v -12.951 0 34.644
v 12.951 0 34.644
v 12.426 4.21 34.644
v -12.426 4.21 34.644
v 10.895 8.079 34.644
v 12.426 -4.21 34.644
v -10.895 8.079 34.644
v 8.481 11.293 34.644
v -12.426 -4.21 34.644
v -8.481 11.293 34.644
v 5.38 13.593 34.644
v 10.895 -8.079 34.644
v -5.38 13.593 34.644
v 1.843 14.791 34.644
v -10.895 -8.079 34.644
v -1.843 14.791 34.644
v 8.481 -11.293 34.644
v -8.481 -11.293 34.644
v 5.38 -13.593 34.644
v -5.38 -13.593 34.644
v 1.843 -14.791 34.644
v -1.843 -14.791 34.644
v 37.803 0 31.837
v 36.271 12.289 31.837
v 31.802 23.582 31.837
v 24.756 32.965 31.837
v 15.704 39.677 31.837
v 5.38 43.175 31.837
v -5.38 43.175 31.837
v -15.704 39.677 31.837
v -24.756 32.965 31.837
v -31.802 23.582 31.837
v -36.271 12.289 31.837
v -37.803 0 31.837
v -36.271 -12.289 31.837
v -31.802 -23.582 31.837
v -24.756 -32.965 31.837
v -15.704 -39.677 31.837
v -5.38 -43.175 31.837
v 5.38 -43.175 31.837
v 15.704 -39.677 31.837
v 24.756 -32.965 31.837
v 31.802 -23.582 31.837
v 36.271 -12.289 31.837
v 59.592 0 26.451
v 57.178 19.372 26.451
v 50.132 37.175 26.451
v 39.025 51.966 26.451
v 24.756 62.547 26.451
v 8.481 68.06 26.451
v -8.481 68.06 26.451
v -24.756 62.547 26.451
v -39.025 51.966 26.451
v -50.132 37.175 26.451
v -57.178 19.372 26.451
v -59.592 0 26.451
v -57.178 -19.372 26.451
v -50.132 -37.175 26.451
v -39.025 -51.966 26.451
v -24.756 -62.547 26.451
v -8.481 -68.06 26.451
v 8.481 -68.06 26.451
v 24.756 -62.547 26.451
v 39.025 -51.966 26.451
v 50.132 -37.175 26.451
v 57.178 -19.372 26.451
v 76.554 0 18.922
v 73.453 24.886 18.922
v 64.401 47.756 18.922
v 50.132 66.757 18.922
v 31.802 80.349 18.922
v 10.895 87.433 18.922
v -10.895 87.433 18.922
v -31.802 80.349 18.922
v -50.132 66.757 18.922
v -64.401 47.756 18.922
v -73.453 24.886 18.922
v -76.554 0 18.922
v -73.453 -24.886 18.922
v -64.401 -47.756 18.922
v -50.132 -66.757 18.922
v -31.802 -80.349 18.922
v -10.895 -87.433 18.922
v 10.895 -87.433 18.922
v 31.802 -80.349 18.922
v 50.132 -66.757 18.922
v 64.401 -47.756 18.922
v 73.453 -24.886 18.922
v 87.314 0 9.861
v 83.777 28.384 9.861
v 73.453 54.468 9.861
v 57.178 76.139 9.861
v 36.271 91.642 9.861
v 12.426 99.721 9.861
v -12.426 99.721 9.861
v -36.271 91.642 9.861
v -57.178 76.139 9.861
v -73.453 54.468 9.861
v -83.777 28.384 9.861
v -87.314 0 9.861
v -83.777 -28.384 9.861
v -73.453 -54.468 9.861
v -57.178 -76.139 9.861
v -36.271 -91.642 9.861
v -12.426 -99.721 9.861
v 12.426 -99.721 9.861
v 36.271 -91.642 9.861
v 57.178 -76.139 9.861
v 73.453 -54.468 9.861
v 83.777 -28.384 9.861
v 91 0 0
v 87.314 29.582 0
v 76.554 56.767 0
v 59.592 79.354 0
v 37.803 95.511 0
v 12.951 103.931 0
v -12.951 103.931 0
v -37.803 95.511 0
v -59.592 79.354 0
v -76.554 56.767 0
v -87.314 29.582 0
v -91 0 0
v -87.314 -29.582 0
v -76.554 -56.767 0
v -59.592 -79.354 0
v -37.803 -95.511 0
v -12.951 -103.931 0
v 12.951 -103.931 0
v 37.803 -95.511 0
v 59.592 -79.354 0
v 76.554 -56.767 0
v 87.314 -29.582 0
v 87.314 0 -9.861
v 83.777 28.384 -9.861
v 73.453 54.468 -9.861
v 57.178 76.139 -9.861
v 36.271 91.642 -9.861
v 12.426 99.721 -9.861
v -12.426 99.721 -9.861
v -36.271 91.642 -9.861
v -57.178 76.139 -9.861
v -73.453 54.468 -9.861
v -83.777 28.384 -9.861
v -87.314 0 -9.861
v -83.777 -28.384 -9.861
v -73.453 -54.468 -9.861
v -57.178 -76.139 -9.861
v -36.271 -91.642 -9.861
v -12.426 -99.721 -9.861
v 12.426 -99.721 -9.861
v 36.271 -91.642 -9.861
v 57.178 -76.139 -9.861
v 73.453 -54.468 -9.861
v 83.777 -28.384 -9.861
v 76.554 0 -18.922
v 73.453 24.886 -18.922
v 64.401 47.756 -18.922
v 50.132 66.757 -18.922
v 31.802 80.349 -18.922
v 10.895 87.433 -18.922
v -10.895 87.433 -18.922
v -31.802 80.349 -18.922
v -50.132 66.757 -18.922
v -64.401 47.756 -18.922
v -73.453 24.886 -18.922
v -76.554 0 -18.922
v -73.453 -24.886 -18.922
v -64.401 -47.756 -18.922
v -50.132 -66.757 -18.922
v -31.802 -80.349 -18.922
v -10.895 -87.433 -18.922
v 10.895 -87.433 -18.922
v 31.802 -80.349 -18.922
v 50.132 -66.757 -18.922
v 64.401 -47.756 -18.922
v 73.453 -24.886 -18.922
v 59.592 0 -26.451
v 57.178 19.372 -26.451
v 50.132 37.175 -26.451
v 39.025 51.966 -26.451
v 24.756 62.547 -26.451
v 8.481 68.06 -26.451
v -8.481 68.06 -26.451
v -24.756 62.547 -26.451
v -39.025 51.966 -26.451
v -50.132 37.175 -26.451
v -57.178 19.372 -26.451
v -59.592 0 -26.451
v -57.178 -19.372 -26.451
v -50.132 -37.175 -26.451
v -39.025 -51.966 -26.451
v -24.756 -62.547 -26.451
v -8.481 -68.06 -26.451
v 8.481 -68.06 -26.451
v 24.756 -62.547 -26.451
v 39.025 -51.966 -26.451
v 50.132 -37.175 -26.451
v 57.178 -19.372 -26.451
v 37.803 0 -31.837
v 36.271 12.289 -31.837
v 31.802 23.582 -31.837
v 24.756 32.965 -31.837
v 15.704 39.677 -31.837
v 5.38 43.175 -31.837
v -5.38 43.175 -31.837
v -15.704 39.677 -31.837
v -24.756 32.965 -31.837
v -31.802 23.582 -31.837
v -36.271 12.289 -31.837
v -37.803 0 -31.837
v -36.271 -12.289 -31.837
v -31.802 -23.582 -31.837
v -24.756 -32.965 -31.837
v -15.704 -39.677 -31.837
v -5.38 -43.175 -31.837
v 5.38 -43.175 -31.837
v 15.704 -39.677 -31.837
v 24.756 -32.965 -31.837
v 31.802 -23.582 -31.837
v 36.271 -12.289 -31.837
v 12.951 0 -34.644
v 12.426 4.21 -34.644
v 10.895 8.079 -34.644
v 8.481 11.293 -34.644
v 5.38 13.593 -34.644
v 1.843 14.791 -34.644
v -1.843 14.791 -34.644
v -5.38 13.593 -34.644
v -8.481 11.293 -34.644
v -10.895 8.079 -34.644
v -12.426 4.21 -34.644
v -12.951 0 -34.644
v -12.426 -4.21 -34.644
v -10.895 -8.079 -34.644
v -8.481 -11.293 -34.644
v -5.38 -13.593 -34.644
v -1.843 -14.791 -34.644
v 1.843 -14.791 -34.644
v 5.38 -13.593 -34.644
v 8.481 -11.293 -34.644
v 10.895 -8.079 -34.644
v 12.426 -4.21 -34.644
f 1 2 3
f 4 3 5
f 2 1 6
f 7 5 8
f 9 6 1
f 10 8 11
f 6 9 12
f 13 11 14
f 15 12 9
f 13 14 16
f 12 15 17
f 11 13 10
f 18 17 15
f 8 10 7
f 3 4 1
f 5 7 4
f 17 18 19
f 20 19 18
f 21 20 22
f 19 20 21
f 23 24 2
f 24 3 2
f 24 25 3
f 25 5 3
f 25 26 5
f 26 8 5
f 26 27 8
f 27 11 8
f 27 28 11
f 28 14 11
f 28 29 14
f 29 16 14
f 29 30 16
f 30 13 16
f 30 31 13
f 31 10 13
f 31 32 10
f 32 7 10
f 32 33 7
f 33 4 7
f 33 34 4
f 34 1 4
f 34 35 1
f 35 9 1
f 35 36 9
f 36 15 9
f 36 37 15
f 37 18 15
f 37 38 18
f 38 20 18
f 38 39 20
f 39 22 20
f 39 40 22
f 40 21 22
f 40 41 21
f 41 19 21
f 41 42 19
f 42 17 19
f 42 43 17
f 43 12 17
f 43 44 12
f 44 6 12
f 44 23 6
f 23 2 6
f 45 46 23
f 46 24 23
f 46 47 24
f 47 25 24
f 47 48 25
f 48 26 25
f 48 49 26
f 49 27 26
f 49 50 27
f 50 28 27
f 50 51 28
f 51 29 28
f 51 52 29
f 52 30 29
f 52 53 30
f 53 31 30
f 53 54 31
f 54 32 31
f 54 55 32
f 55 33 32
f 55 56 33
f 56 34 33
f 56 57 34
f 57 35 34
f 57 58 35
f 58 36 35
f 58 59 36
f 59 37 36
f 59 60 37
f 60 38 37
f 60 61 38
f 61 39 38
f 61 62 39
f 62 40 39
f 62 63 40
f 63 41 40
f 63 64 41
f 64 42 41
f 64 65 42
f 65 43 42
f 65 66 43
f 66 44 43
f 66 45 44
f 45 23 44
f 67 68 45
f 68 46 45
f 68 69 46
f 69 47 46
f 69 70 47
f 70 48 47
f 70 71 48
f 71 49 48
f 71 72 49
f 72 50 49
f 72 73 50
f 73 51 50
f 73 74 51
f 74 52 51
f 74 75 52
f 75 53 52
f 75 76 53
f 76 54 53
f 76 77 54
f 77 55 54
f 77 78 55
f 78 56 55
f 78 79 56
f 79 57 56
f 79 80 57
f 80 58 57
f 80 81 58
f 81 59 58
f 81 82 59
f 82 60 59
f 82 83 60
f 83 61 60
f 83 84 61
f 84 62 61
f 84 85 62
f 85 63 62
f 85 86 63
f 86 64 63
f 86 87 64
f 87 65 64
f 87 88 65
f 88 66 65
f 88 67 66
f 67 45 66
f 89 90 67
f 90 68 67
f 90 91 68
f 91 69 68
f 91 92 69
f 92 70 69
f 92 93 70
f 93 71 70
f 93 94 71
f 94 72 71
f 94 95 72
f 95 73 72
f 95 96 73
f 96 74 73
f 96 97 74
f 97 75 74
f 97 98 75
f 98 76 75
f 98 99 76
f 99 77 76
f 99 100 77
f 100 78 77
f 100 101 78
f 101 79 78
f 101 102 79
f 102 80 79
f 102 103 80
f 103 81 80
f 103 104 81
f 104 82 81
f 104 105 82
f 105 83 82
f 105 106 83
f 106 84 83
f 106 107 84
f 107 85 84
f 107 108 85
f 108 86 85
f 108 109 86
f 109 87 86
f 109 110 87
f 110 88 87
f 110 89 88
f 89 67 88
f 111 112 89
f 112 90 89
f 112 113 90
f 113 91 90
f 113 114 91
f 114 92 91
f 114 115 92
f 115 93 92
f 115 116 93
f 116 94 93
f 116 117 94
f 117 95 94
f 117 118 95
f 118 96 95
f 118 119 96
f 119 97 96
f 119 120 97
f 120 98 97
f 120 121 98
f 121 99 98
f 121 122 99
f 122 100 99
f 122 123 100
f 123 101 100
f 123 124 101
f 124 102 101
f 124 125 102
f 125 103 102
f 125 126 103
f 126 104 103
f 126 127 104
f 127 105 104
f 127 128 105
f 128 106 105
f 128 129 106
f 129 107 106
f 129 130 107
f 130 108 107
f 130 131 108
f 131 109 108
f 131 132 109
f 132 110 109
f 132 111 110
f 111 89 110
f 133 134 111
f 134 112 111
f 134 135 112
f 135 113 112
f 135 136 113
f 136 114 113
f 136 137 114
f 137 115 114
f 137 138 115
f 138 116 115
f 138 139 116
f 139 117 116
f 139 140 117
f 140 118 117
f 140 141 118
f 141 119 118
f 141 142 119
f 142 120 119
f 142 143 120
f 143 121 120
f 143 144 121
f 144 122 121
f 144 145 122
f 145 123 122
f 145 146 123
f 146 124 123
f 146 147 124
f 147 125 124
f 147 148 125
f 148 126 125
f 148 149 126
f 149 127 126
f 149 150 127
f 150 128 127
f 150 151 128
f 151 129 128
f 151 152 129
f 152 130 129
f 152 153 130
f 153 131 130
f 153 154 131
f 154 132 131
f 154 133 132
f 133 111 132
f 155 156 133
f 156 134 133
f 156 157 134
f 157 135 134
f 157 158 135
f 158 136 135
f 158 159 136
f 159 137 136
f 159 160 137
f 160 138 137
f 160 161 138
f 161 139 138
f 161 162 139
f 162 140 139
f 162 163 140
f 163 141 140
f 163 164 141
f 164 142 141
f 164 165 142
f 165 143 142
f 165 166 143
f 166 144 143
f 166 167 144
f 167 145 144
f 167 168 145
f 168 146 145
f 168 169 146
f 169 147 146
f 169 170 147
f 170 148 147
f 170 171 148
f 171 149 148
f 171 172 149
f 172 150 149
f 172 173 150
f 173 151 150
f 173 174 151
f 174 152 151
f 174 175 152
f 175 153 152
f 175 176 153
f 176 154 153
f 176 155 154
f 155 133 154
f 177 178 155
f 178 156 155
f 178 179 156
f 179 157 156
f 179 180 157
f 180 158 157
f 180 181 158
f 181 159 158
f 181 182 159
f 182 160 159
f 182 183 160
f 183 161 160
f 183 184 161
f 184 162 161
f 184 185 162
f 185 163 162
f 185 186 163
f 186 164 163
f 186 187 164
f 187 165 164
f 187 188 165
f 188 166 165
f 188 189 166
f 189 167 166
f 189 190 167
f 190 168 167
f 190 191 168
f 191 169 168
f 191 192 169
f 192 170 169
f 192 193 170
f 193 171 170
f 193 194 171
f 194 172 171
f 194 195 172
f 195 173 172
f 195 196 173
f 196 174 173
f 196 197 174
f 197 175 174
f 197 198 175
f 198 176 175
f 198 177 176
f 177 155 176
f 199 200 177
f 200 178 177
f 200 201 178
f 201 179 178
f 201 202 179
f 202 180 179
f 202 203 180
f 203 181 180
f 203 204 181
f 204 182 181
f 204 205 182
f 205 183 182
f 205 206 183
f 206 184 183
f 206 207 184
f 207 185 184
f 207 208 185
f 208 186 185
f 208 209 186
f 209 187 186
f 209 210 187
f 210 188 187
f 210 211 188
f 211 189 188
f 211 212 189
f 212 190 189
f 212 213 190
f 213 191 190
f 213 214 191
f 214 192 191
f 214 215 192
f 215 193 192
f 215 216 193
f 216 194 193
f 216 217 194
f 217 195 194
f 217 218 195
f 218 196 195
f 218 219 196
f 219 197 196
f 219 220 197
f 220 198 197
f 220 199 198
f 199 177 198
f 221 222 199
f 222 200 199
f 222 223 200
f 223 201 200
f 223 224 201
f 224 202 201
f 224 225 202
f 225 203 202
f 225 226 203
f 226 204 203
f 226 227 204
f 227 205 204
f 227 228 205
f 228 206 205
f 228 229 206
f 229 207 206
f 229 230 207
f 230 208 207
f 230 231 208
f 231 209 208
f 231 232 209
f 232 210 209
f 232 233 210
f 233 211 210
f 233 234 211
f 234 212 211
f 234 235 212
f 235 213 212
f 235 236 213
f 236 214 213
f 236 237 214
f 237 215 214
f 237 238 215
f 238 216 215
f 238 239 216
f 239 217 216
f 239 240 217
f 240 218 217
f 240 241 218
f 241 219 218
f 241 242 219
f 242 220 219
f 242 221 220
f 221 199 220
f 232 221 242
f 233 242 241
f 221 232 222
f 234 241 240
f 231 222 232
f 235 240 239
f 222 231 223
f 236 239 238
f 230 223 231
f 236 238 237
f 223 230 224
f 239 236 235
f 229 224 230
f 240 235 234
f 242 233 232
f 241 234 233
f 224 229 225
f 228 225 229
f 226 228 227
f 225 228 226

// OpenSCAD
// Generated by SolidPython 1.0.1 on 2020-07-29 00:46:51


scale(v = [13, 15, 5]) {
	sphere(r = 7);
}
/***********************************************
*********      SolidPython code:      **********
************************************************
 
# import packages: SolidPython
from solid import *
from solid.utils import *
from itertools import chain, combinations, permutations


class Resize:

    def __init__(self, scad_file):
        self.scad_file = scad_file
        #self.scad_file = import_scad(scad_file)
        # cone/cylinder param:
        self.r1 = 0
        self.r2 = 0
        self.h = 0
        # rectangular prism param:
        self.w = 0
        self.l = 0
        # ellipse param:
        self.r = 0

    # import OpenScad code (file name corresponds to shape)


    # classify shape + parameters
    def assign(self, param1, param2, param3):
        if self.scad_file == 'cone.scad':
            self.r1 = param1
            self.r2 = param2
            self.h = param3
        elif self.scad_file == 'cylinder.scad':
            self.r1 = param1
            self.r2 = param2
            self.h = param3
        elif self.scad_file == 'rectangularPrism.scad':
            self.h = param1
            self.l = param2
            self.w = param3
        else:
            self.r = param1
            self.h = param2

    # resize parameters
    def iterate(self):
        x = range(3, 20, 2)
        i = 1
        if self.scad_file == 'cone.scad':
            tempList = list(permutations(x, 2))
            for temp in tempList:
                param1 = temp[0]
                param2 = temp[1]
                filepath = 'produced_scad_files/' + 'cone' + str(param1) + '_' + str(param2) + '_' + '.scad'
                scad_render_to_file(cylinder(h=param1, r1=param2, r2=0), filepath)

        elif self.scad_file == 'cylinder.scad':
            tempList = list(permutations(x, 3))
            for temp in tempList:
                param1 = temp[0]
                param2 = temp[1]
                filepath = 'produced_scad_files/' + 'cylinder' + str(param1) + '_' + str(param2) + '_' + '.scad'
                scad_render_to_file(cylinder(h=param1, r1=param2, r2=param2), filepath)

        elif self.scad_file == 'rectangularPrism.scad':
            tempList = list(permutations(x, 3))
            for temp in tempList:
                param1 = temp[0]
                param2 = temp[1]
                param3 = temp[2]
                filepath = 'produced_scad_files/' + 'rectangularPrism' + str(param1) + '_' + str(param2) + '_' + str(
                    param3) + '.scad'
                scad_render_to_file(cube(size=(param1, param2, param3)), filepath)

        elif self.scad_file == 'ellipse.scad':
            tempList = list(permutations(x, 4))
            for temp in tempList:
                param1 = temp[0]
                param2 = temp[1]
                param3 = temp[2]
                param4 = temp[3]
                filepath = 'produced_scad_files/' + 'ellipse' + str(param1) + '_' + str(param2) + '_' + str(param3) + '_' + str(param4) + '.scad'
                scad_render_to_file(scale([param1, param2, param3])(sphere(r=param4)), filepath)

    def render_to_scadfile(self):
        scad_render_to_file(scad, 'example.scad') 
 
************************************************/
